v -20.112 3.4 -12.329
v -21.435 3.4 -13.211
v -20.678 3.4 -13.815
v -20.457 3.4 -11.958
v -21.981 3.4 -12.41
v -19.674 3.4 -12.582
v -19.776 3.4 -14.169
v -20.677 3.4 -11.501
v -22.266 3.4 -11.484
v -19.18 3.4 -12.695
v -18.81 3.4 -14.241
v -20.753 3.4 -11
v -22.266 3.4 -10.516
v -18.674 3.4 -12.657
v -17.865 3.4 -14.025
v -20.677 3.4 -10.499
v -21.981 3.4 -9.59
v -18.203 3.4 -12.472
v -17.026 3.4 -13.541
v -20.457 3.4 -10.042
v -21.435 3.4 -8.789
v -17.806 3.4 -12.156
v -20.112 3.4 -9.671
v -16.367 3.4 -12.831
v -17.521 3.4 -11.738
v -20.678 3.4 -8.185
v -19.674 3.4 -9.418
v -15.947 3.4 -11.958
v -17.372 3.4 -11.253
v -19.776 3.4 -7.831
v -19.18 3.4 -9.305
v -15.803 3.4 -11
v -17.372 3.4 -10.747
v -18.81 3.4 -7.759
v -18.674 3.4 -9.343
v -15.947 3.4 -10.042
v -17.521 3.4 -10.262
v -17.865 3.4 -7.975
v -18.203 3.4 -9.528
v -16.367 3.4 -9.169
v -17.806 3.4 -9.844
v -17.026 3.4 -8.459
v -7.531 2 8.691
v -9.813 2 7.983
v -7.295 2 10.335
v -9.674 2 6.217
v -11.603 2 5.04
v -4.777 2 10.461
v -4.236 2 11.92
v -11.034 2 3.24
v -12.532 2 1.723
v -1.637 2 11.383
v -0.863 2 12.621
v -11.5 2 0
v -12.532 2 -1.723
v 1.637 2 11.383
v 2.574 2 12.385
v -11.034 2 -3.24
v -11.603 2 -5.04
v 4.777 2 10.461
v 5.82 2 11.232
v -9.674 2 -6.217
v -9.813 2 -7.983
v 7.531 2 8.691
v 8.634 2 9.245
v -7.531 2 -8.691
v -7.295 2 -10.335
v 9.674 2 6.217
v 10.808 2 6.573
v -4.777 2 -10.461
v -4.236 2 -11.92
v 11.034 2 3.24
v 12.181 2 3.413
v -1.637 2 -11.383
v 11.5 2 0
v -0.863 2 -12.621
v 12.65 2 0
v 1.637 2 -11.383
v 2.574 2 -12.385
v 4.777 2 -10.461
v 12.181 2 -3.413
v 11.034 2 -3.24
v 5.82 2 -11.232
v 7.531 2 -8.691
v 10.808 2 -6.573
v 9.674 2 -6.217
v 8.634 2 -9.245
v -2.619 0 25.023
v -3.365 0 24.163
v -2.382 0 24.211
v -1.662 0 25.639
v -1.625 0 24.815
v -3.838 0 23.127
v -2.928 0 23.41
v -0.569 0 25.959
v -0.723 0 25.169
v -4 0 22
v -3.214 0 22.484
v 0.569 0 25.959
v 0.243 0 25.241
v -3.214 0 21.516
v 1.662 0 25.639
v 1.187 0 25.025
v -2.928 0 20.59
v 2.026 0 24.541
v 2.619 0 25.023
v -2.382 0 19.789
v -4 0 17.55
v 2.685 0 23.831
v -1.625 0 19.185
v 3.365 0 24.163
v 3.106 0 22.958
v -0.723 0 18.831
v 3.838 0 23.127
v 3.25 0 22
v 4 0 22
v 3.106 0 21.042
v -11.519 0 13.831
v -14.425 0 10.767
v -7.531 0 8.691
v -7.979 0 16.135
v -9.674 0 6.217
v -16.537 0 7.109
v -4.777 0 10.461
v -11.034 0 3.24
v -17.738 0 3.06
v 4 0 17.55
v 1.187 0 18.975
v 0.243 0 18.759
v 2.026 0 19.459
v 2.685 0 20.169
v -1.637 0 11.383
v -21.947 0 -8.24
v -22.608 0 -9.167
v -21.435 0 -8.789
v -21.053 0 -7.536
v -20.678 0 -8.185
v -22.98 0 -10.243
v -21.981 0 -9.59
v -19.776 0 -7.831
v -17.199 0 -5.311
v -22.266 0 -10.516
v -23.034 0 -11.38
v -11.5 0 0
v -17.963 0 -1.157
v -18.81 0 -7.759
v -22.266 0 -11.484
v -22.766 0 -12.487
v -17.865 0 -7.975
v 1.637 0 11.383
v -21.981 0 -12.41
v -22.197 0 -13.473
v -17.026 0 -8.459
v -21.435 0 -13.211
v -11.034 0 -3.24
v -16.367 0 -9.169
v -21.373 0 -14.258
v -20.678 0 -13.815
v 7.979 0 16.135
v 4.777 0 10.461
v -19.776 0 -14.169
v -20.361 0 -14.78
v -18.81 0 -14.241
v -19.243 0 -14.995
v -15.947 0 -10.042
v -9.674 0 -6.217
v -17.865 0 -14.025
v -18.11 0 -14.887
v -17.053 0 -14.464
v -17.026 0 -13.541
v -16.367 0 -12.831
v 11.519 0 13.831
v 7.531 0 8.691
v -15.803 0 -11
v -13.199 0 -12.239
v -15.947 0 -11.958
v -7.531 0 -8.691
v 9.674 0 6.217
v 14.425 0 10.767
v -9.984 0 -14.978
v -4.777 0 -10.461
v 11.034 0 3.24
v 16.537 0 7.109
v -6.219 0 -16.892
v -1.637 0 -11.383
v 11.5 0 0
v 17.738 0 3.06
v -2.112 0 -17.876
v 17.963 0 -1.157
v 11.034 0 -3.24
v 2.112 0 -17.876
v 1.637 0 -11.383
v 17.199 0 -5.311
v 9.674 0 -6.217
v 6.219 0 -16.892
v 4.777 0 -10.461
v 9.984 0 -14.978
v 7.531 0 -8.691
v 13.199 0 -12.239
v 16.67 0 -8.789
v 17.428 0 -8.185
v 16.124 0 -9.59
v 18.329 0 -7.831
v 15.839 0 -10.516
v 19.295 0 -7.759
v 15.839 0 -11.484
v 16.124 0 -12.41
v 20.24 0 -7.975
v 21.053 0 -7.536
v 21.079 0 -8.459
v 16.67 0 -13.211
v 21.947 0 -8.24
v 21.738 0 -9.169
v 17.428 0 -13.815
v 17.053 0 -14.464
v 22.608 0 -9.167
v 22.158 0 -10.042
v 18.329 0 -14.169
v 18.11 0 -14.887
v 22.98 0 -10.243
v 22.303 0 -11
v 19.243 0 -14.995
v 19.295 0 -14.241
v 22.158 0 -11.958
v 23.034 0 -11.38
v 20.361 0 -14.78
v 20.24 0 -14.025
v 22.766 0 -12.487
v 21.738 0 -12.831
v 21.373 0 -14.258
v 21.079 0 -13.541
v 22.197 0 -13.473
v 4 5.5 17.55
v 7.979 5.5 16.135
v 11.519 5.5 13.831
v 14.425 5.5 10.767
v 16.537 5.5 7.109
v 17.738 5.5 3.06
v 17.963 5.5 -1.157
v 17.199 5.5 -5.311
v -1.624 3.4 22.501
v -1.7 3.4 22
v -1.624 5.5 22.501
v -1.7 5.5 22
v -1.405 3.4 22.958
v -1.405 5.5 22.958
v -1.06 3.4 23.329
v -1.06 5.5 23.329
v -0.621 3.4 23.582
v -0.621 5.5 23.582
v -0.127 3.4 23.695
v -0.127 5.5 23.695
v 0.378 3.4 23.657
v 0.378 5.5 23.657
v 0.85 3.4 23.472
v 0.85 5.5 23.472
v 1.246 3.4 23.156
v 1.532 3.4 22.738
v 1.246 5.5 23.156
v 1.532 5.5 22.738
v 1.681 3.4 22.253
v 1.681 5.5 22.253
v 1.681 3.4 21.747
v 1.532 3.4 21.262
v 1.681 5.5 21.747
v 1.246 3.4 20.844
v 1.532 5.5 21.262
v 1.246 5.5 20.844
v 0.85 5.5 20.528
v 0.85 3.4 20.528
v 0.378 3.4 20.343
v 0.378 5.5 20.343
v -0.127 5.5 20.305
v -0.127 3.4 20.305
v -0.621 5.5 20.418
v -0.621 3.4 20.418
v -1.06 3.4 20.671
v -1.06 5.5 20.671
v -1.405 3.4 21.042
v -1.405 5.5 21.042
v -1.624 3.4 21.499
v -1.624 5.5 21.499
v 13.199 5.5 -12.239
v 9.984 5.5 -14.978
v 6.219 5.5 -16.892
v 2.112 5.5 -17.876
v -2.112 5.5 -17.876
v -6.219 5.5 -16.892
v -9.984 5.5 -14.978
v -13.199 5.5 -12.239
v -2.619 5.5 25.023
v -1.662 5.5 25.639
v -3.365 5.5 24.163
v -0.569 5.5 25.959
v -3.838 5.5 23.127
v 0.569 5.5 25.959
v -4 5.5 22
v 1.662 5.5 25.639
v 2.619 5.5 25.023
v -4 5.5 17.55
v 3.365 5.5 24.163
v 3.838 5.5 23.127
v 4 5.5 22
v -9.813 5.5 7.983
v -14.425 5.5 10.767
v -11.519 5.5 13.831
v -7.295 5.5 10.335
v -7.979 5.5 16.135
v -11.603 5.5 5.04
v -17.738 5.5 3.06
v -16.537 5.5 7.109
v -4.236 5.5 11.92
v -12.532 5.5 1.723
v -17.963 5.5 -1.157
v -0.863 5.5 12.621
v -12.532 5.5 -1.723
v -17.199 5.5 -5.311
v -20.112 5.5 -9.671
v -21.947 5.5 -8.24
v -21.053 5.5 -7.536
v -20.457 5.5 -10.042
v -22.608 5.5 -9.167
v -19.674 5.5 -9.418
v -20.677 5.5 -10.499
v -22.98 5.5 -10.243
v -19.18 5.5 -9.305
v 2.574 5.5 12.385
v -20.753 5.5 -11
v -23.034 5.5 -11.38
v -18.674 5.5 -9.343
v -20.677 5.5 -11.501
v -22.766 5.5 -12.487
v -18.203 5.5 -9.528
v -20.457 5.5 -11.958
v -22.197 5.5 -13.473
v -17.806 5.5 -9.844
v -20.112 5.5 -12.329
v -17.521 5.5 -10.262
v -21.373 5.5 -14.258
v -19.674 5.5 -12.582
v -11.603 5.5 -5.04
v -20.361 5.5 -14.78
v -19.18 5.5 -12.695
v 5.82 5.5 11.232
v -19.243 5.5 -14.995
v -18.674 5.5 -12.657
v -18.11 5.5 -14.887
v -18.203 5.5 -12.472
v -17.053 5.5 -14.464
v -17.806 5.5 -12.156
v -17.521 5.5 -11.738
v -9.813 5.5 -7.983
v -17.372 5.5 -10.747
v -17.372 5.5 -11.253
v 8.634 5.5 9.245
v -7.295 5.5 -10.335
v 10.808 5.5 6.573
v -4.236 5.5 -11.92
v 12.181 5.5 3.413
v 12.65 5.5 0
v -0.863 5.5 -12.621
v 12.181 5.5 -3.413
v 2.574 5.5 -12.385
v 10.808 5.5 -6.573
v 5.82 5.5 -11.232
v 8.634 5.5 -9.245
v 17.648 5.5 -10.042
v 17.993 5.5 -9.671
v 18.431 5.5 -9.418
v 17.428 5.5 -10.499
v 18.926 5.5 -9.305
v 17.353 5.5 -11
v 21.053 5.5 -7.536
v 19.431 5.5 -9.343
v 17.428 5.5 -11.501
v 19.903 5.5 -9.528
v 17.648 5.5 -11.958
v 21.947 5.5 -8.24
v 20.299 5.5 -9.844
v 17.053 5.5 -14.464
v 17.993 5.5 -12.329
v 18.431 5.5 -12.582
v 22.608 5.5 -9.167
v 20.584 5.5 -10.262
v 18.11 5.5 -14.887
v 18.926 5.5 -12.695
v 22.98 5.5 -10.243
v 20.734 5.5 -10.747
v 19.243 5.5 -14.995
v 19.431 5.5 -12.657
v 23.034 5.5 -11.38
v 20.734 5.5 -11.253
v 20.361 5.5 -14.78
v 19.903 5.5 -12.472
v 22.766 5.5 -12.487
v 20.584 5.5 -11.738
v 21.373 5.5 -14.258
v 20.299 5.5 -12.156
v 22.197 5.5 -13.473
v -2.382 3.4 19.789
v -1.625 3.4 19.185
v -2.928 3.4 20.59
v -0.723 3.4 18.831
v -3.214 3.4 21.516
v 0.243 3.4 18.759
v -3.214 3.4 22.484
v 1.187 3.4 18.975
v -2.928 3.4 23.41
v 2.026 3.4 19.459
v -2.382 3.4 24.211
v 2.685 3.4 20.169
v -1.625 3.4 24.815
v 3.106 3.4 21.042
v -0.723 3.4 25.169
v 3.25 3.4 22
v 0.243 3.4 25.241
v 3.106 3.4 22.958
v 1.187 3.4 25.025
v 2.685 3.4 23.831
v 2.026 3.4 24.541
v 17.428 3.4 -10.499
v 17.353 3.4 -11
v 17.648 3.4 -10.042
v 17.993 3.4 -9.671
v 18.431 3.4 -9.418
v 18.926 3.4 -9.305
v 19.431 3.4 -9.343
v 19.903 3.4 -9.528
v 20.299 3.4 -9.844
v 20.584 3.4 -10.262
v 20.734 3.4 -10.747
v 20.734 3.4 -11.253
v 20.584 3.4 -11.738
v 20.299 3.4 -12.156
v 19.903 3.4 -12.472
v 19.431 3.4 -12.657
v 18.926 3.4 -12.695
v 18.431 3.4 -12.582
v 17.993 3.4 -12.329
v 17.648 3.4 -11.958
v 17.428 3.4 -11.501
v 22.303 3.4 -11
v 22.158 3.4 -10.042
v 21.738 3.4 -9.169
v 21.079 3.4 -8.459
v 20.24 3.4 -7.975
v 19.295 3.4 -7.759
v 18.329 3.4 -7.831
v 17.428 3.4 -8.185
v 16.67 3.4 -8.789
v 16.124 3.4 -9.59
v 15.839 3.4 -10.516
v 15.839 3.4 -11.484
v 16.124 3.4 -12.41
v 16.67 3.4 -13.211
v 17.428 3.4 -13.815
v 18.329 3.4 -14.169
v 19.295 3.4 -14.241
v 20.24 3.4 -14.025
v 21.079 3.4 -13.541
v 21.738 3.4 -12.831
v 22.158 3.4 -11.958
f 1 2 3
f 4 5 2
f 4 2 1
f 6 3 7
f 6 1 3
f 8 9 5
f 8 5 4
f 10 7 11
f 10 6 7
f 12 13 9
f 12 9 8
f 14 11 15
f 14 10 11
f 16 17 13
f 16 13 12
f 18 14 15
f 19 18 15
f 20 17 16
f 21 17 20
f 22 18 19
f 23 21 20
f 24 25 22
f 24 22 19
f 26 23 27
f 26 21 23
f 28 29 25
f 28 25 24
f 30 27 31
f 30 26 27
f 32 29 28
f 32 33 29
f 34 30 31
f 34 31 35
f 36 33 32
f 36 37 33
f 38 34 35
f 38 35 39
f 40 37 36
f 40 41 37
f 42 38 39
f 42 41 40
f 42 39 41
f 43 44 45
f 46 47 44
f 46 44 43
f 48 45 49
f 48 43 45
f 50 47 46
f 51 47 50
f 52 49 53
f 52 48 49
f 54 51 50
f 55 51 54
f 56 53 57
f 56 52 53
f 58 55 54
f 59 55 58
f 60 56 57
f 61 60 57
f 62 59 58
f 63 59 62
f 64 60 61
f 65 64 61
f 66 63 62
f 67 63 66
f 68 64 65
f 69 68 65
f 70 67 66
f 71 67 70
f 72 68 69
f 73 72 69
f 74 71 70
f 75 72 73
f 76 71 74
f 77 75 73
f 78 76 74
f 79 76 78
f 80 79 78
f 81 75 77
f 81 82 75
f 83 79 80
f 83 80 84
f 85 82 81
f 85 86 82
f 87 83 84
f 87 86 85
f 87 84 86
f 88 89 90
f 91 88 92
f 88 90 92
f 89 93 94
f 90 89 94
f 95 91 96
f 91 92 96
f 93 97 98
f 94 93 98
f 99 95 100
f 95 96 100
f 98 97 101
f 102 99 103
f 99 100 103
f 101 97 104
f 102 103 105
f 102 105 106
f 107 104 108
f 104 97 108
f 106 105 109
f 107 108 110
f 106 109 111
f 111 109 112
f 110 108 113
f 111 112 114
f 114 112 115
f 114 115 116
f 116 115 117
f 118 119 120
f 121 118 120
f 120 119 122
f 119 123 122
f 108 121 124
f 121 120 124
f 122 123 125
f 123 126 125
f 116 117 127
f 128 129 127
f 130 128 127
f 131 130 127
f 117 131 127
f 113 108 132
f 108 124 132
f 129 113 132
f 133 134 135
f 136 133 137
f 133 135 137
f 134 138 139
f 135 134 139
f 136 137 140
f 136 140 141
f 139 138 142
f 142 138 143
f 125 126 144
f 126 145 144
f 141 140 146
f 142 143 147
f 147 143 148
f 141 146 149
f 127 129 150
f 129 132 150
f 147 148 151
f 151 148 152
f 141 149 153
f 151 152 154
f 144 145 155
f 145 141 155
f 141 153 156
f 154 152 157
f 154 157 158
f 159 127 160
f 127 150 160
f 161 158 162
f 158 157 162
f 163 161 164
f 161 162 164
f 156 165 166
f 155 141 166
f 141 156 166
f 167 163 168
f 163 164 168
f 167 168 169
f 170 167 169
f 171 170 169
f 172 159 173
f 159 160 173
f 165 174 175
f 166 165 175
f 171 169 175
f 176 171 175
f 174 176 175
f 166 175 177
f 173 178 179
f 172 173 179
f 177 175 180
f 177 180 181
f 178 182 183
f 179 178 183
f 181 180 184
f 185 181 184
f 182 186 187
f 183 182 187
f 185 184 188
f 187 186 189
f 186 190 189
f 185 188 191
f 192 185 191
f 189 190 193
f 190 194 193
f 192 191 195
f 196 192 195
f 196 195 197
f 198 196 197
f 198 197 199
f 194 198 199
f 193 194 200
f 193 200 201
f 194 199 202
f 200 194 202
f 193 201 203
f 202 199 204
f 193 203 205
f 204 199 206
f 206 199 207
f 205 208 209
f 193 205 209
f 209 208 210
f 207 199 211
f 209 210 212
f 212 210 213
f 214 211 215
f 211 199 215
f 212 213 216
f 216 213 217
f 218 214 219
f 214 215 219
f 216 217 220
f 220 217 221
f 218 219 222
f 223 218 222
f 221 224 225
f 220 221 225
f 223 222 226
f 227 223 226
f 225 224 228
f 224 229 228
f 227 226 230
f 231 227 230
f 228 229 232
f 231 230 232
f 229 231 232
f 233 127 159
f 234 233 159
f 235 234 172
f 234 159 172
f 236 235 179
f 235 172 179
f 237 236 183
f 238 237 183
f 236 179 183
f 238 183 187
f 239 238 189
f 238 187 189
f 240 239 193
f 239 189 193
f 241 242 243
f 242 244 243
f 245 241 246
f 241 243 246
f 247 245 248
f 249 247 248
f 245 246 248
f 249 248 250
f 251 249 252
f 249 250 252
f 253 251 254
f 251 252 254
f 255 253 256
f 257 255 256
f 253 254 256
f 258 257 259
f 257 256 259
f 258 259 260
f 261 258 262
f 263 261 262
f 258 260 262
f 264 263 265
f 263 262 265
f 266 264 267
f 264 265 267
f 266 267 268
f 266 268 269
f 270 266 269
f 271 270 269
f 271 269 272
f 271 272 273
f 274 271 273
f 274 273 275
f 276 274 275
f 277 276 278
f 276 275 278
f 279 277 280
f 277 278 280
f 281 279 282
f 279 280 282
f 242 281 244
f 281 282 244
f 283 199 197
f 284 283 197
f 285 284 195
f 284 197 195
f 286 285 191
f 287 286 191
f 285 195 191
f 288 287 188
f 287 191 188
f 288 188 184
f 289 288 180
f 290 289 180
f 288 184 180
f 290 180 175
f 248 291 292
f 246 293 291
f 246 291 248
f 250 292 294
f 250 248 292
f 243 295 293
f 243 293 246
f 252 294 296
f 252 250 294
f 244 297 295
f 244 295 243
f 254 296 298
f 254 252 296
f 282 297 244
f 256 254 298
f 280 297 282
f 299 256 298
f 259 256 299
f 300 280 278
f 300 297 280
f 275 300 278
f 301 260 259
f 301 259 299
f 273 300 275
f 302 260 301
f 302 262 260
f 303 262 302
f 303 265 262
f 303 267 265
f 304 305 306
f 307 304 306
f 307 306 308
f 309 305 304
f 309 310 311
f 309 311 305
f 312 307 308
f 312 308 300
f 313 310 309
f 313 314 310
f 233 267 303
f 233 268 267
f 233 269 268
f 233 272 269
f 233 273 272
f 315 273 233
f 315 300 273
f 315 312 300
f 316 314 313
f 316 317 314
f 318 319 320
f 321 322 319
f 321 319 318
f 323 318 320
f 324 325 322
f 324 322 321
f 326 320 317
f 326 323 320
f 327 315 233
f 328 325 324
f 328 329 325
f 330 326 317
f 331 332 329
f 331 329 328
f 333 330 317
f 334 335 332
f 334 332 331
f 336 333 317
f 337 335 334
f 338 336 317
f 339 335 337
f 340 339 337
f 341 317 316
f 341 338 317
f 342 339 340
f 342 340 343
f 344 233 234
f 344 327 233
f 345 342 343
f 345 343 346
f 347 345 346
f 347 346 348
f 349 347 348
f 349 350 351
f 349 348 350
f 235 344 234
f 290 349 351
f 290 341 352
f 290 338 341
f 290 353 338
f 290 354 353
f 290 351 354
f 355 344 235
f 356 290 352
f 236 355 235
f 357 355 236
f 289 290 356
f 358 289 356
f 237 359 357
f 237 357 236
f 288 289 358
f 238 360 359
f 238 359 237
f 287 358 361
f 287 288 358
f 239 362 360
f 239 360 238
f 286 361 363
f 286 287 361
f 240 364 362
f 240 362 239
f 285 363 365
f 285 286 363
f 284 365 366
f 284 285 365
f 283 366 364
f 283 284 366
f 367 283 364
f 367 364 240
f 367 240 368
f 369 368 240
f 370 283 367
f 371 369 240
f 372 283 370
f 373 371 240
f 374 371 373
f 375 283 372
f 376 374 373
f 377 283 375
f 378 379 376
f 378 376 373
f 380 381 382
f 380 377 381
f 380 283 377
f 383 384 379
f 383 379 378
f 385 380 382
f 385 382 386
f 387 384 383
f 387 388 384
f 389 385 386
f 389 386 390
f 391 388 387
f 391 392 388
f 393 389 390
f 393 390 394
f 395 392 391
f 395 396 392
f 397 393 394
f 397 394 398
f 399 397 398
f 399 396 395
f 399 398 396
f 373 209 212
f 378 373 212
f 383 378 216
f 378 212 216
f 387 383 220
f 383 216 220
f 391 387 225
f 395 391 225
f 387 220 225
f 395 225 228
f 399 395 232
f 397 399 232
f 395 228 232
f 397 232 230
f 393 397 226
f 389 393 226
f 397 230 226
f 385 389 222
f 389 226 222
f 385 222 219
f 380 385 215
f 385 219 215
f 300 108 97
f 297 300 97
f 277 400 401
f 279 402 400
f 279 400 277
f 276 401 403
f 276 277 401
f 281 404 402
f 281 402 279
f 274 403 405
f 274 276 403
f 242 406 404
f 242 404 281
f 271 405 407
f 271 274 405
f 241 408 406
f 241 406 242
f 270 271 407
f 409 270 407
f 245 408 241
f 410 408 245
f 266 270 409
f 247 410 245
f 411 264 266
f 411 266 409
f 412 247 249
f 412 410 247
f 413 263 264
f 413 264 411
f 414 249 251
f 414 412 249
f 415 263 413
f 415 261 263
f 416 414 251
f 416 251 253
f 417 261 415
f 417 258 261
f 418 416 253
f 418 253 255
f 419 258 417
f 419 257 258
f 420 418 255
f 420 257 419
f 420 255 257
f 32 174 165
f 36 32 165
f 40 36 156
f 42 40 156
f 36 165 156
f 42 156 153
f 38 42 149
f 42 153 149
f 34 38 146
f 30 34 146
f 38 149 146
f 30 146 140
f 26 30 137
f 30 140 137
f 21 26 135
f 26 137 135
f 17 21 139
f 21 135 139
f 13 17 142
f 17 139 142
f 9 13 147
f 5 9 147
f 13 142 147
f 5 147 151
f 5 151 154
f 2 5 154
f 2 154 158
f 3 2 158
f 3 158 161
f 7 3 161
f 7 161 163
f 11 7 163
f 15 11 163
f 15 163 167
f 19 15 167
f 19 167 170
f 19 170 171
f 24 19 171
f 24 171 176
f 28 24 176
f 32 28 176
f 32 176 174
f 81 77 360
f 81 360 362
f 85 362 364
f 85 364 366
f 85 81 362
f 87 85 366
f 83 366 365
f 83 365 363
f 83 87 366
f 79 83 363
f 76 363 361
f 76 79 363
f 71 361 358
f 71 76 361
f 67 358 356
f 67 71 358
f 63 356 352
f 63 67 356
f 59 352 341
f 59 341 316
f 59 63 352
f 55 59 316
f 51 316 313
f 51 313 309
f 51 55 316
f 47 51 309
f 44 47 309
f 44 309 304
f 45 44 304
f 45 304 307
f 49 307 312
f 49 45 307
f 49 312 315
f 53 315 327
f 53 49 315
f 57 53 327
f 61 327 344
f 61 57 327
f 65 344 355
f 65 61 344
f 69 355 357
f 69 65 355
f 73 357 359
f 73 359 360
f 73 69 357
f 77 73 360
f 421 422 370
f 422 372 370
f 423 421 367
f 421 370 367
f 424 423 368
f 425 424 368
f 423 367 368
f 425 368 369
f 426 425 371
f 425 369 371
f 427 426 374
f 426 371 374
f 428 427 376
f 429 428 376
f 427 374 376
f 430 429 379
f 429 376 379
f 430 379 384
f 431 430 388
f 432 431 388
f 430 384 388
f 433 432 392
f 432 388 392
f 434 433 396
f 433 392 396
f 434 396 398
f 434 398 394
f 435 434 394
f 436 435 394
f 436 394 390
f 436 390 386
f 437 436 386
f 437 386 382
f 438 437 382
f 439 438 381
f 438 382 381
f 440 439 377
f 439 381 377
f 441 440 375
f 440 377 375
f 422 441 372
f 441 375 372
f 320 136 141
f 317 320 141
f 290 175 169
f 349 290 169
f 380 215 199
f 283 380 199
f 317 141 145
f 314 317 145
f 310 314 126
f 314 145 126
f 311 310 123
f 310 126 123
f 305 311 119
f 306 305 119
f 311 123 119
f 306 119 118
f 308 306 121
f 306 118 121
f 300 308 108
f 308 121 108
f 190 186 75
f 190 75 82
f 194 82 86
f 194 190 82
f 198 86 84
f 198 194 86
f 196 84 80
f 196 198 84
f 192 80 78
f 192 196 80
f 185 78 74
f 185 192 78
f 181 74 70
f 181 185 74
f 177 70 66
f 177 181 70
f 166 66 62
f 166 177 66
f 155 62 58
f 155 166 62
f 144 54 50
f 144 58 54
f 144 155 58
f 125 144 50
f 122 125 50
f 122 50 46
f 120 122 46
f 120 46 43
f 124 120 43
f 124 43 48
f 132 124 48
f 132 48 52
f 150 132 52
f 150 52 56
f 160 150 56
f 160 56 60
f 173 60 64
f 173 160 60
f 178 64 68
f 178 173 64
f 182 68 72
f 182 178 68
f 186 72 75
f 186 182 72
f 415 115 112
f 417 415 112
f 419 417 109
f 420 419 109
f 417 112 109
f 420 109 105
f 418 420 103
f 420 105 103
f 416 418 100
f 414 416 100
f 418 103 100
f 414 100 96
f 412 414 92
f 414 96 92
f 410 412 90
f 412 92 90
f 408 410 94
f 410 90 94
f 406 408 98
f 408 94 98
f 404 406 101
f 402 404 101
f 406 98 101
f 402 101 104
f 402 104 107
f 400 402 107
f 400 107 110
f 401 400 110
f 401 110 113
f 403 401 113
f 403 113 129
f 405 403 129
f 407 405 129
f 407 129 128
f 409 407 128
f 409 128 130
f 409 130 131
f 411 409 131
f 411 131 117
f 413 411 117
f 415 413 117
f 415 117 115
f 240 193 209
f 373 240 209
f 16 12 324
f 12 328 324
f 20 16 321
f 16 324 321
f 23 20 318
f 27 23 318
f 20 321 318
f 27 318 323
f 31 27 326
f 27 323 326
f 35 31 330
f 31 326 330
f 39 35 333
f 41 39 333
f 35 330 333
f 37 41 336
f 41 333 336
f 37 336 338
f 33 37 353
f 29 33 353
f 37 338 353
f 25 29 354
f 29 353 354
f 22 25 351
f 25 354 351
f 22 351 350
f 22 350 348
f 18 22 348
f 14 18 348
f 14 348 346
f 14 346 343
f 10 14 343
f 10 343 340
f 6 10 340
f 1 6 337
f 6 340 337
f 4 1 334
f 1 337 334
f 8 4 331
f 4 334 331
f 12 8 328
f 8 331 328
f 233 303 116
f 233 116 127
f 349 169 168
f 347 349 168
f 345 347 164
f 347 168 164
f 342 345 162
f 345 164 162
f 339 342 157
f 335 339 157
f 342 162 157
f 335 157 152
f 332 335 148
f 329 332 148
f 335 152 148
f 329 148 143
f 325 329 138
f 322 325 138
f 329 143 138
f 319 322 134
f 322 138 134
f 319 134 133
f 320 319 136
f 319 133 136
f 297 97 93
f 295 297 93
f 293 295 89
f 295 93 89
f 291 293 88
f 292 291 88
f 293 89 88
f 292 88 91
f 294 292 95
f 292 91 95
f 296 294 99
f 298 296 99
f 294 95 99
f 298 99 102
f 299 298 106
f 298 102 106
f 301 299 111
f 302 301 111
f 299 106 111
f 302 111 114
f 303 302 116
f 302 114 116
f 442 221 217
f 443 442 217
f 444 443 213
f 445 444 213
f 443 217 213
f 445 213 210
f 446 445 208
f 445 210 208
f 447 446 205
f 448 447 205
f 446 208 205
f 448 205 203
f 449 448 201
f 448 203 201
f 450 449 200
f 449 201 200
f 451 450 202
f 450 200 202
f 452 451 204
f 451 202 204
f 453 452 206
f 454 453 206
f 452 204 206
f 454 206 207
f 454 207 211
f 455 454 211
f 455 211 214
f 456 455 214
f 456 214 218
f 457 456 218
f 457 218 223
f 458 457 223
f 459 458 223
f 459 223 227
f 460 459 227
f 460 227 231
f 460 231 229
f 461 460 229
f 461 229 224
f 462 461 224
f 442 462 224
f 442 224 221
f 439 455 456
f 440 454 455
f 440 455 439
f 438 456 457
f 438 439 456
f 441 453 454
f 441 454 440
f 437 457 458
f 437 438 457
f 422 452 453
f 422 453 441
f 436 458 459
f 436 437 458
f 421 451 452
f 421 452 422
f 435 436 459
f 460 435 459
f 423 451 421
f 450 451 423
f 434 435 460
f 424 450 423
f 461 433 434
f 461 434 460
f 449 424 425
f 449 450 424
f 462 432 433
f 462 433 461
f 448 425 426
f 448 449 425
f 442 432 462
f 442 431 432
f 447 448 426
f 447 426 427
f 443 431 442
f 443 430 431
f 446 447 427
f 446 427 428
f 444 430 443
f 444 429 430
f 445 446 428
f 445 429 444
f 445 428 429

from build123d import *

# Parameters (mm, degrees)
SKETCH1_R                                           = 11.5
BOSS_EXTRUDE1_DEPTH                                 = 5.5
CUT_EXTRUDE1_START                                  = 2
SKETCH1_3_R                                         = 12.65
CUT_EXTRUDE1_DEPTH                                  = 3.5
CBORE_FOR_M3_HEX_SOCKET_HEAD_CAP_SCREW1_D           = 3.4
CBORE_FOR_M3_HEX_SOCKET_HEAD_CAP_SCREW1_DEPTH       = 45
CBORE_FOR_M3_HEX_SOCKET_HEAD_CAP_SCREW1_CBORE_D     = 6.5
CBORE_FOR_M3_HEX_SOCKET_HEAD_CAP_SCREW1_CBORE_DEPTH = 3.4
CBORE_FOR_M3_HEX_SOCKET_HEAD_CAP_SCREW1_TIP         = 1.021463052


with BuildPart() as part:
    # Sketch1 → Boss-Extrude1 (new body)
    with BuildSketch(Plane(origin=(0, 0, 0), x_dir=(1, 0, 0), z_dir=(0, 1, 0))):
        with BuildLine():
            ThreePointArc((-4, -22), (0, -26), (4, -22))
            Line((4, -22), (4, -17.549928775))
            ThreePointArc((4, -17.549928775), (15.588457268, -9), (17.198684154, 5.310862772))
            Line((17.198684154, 5.310862772), (21.052558883, 7.535898385))
            ThreePointArc((21.052558883, 7.535898385), (22.516660498, 13), (17.052558883, 14.464101615))
            Line((17.052558883, 14.464101615), (13.198684154, 12.239066003))
            ThreePointArc((13.198684154, 12.239066003), (0, 18), (-13.198684154, 12.239066003))
            Line((-13.198684154, 12.239066003), (-17.052558883, 14.464101615))
            ThreePointArc((-17.052558883, 14.464101615), (-22.516660498, 13), (-21.052558883, 7.535898385))
            Line((-21.052558883, 7.535898385), (-17.198684154, 5.310862772))
            ThreePointArc((-17.198684154, 5.310862772), (-15.588457268, -9), (-4, -17.549928775))
            Line((-4, -17.549928775), (-4, -22))
        make_face()
        Circle(SKETCH1_R, mode=Mode.SUBTRACT)
    extrude(amount=BOSS_EXTRUDE1_DEPTH)

    # Sketch1<3> → Cut-Extrude1 (cut)
    with BuildSketch(Plane(origin=(0, 0, 0), x_dir=(1, 0, 0), z_dir=(0, 1, 0)).offset(CUT_EXTRUDE1_START)):
        Circle(SKETCH1_3_R)
    extrude(amount=CUT_EXTRUDE1_DEPTH, mode=Mode.SUBTRACT)

    # CBORE for M3 Hex Socket Head Cap Screw1
    with Locations(Plane.XZ):
        with Locations((-19.052558883, -11), (19.052558883, -11), (0, 22)):
            CounterBoreHole(CBORE_FOR_M3_HEX_SOCKET_HEAD_CAP_SCREW1_D / 2, CBORE_FOR_M3_HEX_SOCKET_HEAD_CAP_SCREW1_CBORE_D / 2, CBORE_FOR_M3_HEX_SOCKET_HEAD_CAP_SCREW1_CBORE_DEPTH, depth=CBORE_FOR_M3_HEX_SOCKET_HEAD_CAP_SCREW1_DEPTH)
            with Locations((0, 0, -(CBORE_FOR_M3_HEX_SOCKET_HEAD_CAP_SCREW1_DEPTH + CBORE_FOR_M3_HEX_SOCKET_HEAD_CAP_SCREW1_TIP / 2))):  # 118° drill point
                Cone(0, CBORE_FOR_M3_HEX_SOCKET_HEAD_CAP_SCREW1_D / 2, CBORE_FOR_M3_HEX_SOCKET_HEAD_CAP_SCREW1_TIP, mode=Mode.SUBTRACT)


solid = part.part
